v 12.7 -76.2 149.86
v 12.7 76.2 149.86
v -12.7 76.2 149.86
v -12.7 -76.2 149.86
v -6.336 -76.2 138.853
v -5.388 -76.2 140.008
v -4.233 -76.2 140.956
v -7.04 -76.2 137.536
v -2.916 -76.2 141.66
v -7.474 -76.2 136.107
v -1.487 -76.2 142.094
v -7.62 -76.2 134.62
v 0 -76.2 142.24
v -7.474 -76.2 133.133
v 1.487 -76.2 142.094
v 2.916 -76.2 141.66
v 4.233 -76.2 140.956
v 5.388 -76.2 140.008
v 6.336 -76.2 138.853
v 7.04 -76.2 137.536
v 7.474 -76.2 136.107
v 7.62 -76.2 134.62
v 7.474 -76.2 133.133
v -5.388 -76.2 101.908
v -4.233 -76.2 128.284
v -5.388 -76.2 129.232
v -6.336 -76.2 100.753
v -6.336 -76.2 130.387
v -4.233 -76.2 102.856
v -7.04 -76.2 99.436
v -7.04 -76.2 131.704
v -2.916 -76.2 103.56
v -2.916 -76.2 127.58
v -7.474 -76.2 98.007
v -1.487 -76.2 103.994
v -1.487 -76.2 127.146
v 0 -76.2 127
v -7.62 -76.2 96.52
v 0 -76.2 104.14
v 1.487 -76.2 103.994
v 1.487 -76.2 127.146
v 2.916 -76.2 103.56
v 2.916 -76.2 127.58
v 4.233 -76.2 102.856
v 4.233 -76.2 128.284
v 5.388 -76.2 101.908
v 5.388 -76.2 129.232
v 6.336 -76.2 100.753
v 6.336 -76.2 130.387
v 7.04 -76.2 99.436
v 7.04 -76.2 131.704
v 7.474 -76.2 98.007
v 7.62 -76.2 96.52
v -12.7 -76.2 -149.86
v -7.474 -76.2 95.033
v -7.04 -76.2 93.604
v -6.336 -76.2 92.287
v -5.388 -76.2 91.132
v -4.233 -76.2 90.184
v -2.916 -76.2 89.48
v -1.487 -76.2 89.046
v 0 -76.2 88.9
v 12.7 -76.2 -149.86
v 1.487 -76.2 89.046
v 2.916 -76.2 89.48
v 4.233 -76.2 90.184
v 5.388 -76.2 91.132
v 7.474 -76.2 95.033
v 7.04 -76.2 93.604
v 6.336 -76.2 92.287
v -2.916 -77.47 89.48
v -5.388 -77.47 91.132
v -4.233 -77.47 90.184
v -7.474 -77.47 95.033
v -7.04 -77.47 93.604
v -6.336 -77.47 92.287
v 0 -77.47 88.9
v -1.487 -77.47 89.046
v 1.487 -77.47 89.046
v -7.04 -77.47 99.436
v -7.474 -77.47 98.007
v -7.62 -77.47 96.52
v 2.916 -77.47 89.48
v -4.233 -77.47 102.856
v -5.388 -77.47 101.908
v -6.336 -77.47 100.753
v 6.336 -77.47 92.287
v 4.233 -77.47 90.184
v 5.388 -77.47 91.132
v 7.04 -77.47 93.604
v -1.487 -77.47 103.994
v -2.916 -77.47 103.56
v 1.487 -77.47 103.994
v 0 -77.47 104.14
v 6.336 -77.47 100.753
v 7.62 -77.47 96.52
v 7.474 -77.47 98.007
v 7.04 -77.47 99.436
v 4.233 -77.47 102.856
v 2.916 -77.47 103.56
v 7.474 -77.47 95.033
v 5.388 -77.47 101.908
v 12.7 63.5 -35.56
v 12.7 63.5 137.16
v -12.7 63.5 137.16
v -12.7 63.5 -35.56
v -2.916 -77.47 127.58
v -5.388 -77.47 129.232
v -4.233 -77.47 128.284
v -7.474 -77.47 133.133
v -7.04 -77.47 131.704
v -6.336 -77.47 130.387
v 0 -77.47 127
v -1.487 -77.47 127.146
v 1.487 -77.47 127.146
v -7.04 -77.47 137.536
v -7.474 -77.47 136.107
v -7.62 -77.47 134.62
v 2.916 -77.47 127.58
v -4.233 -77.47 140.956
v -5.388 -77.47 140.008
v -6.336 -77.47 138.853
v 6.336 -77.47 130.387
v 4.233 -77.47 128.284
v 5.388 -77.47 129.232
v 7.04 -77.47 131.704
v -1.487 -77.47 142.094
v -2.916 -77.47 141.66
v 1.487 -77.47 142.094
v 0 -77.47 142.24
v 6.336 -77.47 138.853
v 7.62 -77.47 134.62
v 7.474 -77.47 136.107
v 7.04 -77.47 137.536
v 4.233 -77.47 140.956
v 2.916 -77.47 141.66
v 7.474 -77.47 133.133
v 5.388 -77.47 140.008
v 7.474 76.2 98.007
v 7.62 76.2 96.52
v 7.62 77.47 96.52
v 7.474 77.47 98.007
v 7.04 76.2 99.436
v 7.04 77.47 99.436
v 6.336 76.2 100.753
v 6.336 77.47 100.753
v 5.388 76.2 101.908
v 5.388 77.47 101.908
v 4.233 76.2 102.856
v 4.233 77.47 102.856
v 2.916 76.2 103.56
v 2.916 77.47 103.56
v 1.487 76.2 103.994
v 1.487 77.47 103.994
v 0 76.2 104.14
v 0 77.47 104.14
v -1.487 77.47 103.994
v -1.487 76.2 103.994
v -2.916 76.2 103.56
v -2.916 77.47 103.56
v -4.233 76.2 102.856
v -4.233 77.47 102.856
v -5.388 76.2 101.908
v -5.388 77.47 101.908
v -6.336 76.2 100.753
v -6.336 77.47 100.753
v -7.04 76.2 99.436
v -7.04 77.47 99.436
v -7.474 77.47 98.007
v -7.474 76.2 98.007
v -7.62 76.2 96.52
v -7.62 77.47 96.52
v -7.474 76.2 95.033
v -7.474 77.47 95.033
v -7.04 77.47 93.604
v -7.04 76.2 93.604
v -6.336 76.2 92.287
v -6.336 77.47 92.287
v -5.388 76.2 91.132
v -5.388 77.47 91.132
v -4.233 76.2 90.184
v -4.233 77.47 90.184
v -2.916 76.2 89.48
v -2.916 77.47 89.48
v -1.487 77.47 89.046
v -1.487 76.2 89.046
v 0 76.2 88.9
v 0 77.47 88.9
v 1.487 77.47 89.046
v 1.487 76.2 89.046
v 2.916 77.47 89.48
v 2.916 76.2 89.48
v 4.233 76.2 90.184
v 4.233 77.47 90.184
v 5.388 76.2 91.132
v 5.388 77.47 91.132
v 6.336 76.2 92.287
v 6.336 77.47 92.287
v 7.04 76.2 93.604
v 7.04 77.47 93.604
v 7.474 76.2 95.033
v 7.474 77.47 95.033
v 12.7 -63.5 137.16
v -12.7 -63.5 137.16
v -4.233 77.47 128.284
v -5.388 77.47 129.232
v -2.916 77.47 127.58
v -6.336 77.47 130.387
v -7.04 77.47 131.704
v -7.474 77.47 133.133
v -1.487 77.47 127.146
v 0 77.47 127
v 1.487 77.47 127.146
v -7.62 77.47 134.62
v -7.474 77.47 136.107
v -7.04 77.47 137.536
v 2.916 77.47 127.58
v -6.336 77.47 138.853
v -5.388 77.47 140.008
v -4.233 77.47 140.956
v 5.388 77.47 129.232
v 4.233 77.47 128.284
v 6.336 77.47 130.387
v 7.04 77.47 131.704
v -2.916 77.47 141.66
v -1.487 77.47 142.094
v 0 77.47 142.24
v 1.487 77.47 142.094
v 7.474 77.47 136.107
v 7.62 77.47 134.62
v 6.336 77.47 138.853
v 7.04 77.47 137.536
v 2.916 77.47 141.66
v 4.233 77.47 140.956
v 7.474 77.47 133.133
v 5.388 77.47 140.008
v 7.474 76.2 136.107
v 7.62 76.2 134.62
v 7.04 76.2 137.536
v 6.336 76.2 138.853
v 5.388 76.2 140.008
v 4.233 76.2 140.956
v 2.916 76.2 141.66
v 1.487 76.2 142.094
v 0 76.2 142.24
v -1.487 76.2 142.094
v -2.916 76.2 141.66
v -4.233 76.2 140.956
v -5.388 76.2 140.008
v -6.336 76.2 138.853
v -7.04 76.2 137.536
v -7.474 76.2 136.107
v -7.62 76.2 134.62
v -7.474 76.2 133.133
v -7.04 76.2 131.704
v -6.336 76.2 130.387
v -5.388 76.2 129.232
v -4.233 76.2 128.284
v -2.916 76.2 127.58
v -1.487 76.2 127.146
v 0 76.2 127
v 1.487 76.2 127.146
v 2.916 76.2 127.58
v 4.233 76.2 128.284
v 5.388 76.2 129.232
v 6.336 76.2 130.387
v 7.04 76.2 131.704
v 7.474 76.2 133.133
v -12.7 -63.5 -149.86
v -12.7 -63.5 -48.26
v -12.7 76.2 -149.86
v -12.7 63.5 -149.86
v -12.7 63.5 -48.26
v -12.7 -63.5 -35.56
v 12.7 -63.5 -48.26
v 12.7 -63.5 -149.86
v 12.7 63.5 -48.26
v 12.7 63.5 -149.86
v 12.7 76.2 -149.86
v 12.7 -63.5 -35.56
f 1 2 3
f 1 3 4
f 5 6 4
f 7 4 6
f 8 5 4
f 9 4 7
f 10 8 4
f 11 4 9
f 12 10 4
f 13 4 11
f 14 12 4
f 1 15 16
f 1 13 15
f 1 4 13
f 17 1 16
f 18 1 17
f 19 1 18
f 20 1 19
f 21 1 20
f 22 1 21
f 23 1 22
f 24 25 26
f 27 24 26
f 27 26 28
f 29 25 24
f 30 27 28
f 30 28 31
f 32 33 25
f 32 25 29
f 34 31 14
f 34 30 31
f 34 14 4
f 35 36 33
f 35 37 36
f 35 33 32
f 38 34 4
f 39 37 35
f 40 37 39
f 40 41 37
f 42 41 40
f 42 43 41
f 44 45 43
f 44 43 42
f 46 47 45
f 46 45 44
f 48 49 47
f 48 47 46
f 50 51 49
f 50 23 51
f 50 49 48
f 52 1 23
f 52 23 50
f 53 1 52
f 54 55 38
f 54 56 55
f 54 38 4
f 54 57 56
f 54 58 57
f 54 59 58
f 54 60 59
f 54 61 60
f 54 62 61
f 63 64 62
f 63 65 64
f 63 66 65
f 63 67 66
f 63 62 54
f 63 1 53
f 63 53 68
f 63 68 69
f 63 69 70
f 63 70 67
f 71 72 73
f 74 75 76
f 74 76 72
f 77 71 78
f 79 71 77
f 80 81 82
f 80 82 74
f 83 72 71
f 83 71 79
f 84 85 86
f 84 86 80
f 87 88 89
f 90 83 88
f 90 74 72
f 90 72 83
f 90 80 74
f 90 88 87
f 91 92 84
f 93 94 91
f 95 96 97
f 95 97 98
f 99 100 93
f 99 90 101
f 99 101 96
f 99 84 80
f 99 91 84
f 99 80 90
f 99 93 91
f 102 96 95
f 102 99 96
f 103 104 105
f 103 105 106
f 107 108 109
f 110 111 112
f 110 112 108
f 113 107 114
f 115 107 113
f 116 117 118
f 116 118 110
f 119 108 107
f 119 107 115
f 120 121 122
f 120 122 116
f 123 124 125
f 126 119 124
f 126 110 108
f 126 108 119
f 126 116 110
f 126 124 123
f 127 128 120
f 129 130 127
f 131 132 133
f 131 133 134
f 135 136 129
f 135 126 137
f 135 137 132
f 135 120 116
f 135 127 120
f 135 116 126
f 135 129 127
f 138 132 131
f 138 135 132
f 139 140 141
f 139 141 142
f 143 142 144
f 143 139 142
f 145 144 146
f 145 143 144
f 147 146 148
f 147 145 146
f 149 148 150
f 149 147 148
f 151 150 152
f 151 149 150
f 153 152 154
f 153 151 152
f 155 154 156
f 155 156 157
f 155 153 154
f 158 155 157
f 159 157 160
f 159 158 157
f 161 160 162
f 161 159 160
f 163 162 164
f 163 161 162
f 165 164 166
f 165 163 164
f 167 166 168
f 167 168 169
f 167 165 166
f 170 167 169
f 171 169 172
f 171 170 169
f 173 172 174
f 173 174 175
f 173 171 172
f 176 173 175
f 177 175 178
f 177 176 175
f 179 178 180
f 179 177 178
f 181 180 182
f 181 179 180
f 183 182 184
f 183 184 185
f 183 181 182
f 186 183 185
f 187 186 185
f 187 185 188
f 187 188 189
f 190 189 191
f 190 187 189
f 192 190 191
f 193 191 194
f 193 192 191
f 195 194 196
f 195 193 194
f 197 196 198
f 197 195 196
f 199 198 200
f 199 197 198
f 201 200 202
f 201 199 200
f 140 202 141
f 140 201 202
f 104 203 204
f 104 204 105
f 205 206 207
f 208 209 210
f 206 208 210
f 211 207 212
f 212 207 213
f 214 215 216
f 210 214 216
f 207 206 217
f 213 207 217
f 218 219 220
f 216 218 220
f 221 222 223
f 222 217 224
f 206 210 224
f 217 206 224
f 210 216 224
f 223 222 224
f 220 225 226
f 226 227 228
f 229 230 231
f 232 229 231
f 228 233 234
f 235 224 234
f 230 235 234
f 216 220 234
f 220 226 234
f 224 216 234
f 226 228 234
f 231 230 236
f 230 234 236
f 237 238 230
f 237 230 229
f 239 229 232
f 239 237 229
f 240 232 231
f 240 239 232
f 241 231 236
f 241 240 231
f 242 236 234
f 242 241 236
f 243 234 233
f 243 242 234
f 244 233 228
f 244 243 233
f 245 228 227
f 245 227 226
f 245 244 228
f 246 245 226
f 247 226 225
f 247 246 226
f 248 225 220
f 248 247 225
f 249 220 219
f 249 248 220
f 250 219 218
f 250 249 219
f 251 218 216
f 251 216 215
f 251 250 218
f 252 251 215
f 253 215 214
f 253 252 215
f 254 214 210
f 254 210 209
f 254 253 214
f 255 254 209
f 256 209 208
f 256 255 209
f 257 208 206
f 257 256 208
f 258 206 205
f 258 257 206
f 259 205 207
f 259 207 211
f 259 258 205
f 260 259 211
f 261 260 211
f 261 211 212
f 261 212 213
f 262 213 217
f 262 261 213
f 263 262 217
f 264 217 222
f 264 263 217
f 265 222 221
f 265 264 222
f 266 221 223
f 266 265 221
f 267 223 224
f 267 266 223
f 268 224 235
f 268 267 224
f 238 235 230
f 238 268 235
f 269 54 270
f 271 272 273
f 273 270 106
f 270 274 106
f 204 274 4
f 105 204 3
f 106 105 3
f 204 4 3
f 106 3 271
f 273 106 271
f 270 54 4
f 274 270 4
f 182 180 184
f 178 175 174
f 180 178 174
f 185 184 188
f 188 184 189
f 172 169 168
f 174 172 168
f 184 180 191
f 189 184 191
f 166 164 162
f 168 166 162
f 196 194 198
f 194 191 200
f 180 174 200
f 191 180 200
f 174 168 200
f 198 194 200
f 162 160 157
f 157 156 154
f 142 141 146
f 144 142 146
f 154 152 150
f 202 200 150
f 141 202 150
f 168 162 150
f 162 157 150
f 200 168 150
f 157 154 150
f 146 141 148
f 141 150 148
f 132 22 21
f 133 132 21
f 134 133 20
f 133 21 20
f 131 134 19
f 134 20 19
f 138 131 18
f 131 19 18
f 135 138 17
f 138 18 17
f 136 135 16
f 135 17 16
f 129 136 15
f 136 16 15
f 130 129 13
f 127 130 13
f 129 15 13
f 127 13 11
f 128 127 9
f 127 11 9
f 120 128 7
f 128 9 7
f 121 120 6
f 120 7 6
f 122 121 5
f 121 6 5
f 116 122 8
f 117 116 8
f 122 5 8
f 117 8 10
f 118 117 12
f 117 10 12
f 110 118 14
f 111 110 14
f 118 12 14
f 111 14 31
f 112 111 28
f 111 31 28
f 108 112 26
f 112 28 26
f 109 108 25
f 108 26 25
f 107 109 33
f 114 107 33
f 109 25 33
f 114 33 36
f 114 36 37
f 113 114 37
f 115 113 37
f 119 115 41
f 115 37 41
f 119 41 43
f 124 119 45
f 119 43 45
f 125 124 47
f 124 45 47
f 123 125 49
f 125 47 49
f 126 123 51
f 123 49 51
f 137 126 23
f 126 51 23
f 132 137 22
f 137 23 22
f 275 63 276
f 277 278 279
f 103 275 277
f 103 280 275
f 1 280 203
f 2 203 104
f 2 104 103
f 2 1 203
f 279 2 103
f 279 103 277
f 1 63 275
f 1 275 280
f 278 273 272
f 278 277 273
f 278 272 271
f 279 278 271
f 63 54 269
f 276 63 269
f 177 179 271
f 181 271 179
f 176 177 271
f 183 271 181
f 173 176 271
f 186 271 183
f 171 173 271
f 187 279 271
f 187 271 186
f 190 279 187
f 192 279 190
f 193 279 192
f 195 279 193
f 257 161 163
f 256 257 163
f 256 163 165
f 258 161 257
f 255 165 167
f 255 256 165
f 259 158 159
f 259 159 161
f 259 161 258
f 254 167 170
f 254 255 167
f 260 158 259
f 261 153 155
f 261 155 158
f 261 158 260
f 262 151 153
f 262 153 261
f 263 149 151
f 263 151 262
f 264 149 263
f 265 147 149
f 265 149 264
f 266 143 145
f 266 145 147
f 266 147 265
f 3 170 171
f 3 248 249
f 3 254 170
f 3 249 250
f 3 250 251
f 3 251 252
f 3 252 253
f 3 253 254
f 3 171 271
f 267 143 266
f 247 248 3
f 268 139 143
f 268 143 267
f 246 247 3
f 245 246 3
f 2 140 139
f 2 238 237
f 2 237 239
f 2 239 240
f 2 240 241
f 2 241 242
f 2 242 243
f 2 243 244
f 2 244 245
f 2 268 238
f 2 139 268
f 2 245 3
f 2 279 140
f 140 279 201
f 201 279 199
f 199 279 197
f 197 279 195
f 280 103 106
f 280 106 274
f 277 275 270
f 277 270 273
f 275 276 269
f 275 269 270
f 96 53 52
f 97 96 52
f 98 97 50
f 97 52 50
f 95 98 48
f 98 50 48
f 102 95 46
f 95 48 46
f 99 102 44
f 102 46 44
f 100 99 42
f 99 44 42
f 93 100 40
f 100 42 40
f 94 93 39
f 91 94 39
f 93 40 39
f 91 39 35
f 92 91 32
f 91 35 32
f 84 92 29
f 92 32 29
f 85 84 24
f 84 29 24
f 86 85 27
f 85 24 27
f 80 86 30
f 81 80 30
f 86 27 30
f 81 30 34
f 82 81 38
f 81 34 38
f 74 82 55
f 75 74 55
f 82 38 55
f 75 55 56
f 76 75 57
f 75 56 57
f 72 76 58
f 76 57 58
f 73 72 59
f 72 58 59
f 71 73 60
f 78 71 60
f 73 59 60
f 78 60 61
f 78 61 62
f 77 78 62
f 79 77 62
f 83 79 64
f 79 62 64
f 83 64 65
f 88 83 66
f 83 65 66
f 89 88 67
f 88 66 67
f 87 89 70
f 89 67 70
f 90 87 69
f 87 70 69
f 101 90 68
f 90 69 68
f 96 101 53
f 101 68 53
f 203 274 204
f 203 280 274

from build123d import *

# Parameters (mm, degrees)
F1_DEPTH = 12.7
F2_R     = 7.62
F3_DEPTH = 1.27


# Not quite as in the source:
# - a pattern or mirror of a feature is missing from the dataset's text; its kind, count and spacing are read off the source's solid


with BuildPart() as f1:
    # F0 (on Right) → F1 (new body, symmetric)
    with BuildSketch(Plane.YZ):
        Polygon((76.2, -149.86), (76.2, 149.86), (-76.2, 149.86), (-76.2, -149.86), (-63.5, -149.86), (-63.5, -48.26), (63.5, -48.26), (63.5, -149.86), align=None)
        Polygon((-63.5, 137.16), (0, 137.16), (63.5, 137.16), (63.5, -35.56), (-63.5, -35.56), align=None, mode=Mode.SUBTRACT)
    extrude(amount=F1_DEPTH, both=True)

    # F2 (on face) → F3 (join)
    with BuildSketch(Plane.XZ.offset(76.2)):
        with Locations((0, 96.52)):
            Circle(F2_R)
        with Locations((0, 134.62)):
            Circle(F2_R)
    f3 = extrude(amount=F3_DEPTH)

    # F3_copies: F3 across plane
    add(f3.mirror(Plane.ZX))


solid = f1.part
